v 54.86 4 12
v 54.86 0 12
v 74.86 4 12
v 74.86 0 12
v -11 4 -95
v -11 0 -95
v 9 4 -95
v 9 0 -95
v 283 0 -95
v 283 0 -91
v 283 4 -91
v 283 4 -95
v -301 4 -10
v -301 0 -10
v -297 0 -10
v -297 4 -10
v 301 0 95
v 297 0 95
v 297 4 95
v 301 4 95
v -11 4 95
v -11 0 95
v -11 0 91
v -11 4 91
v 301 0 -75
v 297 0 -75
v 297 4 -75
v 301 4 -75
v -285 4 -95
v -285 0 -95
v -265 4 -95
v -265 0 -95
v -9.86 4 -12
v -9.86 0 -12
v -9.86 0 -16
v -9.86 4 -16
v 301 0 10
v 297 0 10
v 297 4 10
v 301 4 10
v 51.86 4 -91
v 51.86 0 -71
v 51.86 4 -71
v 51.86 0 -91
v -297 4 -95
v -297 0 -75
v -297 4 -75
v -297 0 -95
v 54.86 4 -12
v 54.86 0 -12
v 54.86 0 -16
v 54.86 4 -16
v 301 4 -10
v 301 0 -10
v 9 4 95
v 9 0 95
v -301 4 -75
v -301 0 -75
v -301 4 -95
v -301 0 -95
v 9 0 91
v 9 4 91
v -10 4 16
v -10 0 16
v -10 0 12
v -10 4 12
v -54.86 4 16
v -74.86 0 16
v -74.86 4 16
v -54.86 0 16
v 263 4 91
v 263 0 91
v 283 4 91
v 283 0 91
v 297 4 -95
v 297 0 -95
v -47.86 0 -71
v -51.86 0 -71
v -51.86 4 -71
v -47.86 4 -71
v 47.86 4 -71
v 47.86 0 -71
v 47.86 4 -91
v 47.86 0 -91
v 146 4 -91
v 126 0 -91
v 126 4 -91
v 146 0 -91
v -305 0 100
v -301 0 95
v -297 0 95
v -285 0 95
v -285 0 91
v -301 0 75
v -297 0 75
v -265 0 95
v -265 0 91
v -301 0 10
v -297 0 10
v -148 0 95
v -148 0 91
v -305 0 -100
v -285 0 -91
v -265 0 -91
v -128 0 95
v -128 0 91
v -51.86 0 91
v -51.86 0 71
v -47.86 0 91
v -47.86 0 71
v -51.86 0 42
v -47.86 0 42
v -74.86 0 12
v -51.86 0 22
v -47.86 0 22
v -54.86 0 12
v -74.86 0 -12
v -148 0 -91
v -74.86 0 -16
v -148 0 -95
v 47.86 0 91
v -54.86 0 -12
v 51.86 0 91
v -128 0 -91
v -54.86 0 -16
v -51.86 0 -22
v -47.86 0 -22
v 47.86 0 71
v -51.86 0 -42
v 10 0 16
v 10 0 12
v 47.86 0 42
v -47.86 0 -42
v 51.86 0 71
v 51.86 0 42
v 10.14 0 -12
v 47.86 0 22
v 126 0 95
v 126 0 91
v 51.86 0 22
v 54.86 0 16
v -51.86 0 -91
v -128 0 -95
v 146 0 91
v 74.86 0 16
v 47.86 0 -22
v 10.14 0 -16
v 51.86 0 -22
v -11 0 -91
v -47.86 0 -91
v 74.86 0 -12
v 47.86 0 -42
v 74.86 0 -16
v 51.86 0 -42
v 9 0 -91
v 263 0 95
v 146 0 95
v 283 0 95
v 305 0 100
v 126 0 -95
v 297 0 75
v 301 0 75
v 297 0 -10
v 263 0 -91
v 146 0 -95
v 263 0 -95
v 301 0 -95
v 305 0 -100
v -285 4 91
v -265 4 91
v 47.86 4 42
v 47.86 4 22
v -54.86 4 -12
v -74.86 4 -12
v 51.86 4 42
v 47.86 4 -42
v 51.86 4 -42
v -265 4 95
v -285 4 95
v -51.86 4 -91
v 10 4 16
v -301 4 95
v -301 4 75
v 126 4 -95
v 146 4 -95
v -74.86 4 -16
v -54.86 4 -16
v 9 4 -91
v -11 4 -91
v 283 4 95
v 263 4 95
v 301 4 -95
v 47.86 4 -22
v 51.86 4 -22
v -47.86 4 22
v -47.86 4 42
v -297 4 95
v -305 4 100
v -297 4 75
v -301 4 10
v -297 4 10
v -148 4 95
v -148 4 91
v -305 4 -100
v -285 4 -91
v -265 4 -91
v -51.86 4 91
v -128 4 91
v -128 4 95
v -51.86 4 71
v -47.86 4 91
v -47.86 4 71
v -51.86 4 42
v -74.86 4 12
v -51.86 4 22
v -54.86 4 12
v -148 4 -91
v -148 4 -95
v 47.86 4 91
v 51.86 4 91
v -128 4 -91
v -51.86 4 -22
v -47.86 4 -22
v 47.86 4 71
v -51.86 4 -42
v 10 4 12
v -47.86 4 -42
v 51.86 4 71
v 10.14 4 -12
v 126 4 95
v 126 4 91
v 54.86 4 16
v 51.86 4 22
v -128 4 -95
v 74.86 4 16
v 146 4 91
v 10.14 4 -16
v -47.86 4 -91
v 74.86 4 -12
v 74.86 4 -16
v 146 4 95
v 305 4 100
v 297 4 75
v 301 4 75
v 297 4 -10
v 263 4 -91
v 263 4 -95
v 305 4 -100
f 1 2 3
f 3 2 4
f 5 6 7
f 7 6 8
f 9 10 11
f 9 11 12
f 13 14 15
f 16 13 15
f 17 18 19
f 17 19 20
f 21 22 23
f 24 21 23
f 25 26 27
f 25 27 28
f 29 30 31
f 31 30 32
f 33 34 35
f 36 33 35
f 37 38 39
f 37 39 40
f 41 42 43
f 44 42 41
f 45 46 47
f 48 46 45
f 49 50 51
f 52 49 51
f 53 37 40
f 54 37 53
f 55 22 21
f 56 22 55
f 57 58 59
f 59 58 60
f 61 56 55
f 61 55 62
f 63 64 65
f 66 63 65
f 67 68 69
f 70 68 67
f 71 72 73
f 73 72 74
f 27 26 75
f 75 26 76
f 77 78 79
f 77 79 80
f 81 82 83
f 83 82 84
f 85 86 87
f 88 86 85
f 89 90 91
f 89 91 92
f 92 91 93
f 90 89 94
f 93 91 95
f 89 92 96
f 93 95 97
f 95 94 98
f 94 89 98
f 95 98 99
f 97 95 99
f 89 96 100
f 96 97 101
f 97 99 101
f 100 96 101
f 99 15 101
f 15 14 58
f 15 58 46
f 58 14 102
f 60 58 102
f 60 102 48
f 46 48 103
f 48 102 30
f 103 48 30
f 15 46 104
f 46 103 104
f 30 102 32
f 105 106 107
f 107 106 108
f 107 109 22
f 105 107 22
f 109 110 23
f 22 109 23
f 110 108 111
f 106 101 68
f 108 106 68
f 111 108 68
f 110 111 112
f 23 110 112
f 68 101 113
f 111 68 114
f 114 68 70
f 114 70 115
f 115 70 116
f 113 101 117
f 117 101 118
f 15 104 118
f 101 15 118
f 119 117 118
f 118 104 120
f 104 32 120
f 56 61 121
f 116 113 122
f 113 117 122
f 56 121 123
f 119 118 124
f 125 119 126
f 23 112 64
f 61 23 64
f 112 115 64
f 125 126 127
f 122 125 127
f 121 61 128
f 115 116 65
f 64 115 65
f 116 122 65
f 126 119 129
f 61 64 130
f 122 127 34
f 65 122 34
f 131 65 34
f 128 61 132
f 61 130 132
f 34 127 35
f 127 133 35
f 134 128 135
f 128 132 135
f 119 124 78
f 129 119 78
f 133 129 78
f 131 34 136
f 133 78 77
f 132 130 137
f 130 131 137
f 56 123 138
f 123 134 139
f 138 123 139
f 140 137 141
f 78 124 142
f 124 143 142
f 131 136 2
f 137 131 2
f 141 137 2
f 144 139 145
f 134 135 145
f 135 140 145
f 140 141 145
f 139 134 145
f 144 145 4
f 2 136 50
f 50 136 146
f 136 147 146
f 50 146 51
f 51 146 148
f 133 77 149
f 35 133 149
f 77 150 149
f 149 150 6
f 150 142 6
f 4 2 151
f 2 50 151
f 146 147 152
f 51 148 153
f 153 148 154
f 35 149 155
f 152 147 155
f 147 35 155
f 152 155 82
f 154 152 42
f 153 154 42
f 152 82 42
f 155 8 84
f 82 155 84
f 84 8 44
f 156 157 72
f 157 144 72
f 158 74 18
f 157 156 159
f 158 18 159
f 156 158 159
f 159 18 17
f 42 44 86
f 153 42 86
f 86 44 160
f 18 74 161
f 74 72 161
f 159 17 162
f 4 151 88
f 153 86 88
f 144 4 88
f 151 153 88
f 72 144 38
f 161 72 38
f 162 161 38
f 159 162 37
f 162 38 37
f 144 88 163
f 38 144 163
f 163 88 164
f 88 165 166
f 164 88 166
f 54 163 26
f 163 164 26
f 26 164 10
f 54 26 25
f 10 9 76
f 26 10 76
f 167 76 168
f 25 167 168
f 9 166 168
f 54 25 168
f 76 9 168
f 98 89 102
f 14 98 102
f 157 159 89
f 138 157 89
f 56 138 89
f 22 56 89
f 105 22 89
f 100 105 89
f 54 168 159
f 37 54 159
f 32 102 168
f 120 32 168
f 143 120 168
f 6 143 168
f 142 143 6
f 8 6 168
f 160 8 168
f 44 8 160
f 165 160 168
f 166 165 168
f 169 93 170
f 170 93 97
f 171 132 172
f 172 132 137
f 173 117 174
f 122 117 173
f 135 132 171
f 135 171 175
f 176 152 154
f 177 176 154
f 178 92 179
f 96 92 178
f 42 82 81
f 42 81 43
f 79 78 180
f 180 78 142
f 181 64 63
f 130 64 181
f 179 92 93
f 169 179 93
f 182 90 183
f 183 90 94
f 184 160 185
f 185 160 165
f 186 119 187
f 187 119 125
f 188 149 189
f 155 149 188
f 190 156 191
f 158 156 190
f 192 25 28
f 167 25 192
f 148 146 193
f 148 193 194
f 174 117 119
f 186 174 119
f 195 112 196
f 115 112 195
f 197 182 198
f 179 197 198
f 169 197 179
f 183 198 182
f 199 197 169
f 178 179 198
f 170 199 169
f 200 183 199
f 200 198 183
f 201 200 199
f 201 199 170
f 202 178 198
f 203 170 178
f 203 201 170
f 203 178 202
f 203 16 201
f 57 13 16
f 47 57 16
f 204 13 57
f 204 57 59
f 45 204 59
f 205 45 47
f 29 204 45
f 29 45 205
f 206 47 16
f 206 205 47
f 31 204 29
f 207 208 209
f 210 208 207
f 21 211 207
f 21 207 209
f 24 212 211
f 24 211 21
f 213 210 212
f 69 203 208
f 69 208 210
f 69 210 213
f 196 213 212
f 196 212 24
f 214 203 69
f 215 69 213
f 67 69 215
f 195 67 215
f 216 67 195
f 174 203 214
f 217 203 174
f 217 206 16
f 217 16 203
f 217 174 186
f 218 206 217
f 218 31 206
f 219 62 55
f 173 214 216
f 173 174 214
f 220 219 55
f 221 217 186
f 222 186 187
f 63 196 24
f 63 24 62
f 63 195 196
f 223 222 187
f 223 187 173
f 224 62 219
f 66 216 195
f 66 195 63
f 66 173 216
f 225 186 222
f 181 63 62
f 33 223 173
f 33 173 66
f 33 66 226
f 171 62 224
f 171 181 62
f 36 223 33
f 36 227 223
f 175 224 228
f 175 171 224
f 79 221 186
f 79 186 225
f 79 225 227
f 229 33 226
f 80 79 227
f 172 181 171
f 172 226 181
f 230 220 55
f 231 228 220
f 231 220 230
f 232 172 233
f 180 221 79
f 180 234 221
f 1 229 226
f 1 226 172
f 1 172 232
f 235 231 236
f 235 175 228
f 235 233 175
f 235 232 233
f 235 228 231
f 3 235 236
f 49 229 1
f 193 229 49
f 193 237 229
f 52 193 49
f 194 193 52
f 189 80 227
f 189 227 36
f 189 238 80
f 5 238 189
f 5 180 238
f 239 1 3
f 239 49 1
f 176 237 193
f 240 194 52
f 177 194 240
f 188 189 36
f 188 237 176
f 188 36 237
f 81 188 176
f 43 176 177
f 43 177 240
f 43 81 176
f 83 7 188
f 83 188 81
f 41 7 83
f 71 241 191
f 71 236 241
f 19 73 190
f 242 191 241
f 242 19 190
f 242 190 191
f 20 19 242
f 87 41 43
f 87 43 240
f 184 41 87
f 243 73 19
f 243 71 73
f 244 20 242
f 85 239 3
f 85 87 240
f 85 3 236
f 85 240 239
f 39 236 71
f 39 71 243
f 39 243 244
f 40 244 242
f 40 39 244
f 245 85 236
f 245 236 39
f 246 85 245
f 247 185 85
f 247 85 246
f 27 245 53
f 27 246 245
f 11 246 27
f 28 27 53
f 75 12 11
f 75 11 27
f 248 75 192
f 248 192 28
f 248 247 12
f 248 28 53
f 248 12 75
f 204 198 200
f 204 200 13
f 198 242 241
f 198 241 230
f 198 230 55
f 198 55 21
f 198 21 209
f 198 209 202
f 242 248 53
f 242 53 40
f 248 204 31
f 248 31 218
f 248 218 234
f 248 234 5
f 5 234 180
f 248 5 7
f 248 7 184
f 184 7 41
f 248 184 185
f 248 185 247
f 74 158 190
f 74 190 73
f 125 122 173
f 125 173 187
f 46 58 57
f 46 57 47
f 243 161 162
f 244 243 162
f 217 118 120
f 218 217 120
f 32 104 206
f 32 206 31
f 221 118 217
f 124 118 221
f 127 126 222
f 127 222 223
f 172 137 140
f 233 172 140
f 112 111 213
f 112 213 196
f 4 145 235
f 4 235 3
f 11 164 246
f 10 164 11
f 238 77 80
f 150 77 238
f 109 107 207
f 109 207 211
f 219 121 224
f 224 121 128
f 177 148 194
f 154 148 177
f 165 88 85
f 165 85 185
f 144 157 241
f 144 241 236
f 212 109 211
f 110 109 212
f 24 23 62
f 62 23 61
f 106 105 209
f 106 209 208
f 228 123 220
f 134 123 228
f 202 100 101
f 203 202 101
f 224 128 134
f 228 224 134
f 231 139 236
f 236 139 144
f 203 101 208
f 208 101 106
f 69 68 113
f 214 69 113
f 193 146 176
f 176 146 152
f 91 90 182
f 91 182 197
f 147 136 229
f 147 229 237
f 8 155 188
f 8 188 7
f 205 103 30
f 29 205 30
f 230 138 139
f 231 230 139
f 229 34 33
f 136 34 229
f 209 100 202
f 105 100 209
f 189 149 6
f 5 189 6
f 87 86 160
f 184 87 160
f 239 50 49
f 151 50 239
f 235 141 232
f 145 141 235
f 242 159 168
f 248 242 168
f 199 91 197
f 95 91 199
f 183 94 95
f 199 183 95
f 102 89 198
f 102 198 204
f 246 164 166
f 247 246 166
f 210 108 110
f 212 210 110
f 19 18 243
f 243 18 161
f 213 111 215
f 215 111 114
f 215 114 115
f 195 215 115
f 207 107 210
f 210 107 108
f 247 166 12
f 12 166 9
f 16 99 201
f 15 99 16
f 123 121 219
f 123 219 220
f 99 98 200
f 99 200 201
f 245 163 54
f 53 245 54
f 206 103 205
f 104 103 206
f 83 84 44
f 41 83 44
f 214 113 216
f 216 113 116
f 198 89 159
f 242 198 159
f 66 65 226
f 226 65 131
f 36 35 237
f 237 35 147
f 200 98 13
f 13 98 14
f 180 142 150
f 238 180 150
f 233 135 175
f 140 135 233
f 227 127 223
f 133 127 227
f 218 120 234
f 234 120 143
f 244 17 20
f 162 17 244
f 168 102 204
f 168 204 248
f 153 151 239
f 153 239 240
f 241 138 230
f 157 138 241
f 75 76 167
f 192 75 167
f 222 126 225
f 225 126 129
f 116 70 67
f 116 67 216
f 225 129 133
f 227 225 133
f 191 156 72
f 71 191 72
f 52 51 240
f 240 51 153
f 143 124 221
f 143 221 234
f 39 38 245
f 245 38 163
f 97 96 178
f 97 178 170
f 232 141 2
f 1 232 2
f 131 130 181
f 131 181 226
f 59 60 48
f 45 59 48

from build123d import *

# Parameters (mm, degrees)
SKETCH1_W           = 610
SKETCH1_H           = 200
SKETCH1_W_2         = 4
SKETCH1_H_2         = 20
SKETCH1_W_3         = 20
SKETCH1_H_3         = 4
BOSS_EXTRUDE1_DEPTH = 4


with BuildPart() as part:
    # Sketch1 → Boss-Extrude1 (new body)
    with BuildSketch(Plane(origin=(0, 0, 0), x_dir=(1, 0, 0), z_dir=(0, 1, 0))):
        Rectangle(SKETCH1_W, SKETCH1_H)
        with Locations((-299, -85)):
            Rectangle(SKETCH1_W_2, SKETCH1_H_2, mode=Mode.SUBTRACT)
        with Locations((-299, 85)):
            Rectangle(SKETCH1_W_2, SKETCH1_H_2, mode=Mode.SUBTRACT)
        with Locations((-299, 0)):
            Rectangle(SKETCH1_W_2, SKETCH1_H_2, mode=Mode.SUBTRACT)
        with Locations((-275, 93)):
            Rectangle(SKETCH1_W_3, SKETCH1_H_3, mode=Mode.SUBTRACT)
        with Locations((-138, 93)):
            Rectangle(SKETCH1_W_3, SKETCH1_H_3, mode=Mode.SUBTRACT)
        with Locations((-1, 93)):
            Rectangle(SKETCH1_W_3, SKETCH1_H_3, mode=Mode.SUBTRACT)
        with Locations((-1, -93)):
            Rectangle(SKETCH1_W_3, SKETCH1_H_3, mode=Mode.SUBTRACT)
        with Locations((-138, -93)):
            Rectangle(SKETCH1_W_3, SKETCH1_H_3, mode=Mode.SUBTRACT)
        with Locations((-275, -93)):
            Rectangle(SKETCH1_W_3, SKETCH1_H_3, mode=Mode.SUBTRACT)
        with Locations((-49.859697176, -81)):
            Rectangle(SKETCH1_W_2, SKETCH1_H_2, mode=Mode.SUBTRACT)
        with Locations((-49.859697176, -32)):
            Rectangle(SKETCH1_W_2, SKETCH1_H_2, mode=Mode.SUBTRACT)
        with Locations((-64.859697176, -14)):
            Rectangle(SKETCH1_W_3, SKETCH1_H_3, mode=Mode.SUBTRACT)
        with Locations((-64.859697176, 14)):
            Rectangle(SKETCH1_W_3, SKETCH1_H_3, mode=Mode.SUBTRACT)
        with Locations((-49.859697176, 32)):
            Rectangle(SKETCH1_W_2, SKETCH1_H_2, mode=Mode.SUBTRACT)
        with Locations((0, -14)):
            Rectangle(SKETCH1_W_3, SKETCH1_H_3, mode=Mode.SUBTRACT)
        with Locations((0.140302824, 14)):
            Rectangle(SKETCH1_W_3, SKETCH1_H_3, mode=Mode.SUBTRACT)
        with Locations((136, 93)):
            Rectangle(SKETCH1_W_3, SKETCH1_H_3, mode=Mode.SUBTRACT)
        with Locations((273, 93)):
            Rectangle(SKETCH1_W_3, SKETCH1_H_3, mode=Mode.SUBTRACT)
        with Locations((49.859697176, -81)):
            Rectangle(SKETCH1_W_2, SKETCH1_H_2, mode=Mode.SUBTRACT)
        with Locations((49.859697176, -32)):
            Rectangle(SKETCH1_W_2, SKETCH1_H_2, mode=Mode.SUBTRACT)
        with Locations((64.859697176, -14)):
            Rectangle(SKETCH1_W_3, SKETCH1_H_3, mode=Mode.SUBTRACT)
        with Locations((64.859697176, 14)):
            Rectangle(SKETCH1_W_3, SKETCH1_H_3, mode=Mode.SUBTRACT)
        with Locations((49.859697176, 32)):
            Rectangle(SKETCH1_W_2, SKETCH1_H_2, mode=Mode.SUBTRACT)
        with Locations((273, -93)):
            Rectangle(SKETCH1_W_3, SKETCH1_H_3, mode=Mode.SUBTRACT)
        with Locations((136, -93)):
            Rectangle(SKETCH1_W_3, SKETCH1_H_3, mode=Mode.SUBTRACT)
        with Locations((49.859697176, 81)):
            Rectangle(SKETCH1_W_2, SKETCH1_H_2, mode=Mode.SUBTRACT)
        with Locations((-49.859697176, 81)):
            Rectangle(SKETCH1_W_2, SKETCH1_H_2, mode=Mode.SUBTRACT)
        with Locations((299, 85)):
            Rectangle(SKETCH1_W_2, SKETCH1_H_2, mode=Mode.SUBTRACT)
        with Locations((299, 0)):
            Rectangle(SKETCH1_W_2, SKETCH1_H_2, mode=Mode.SUBTRACT)
        with Locations((299, -85)):
            Rectangle(SKETCH1_W_2, SKETCH1_H_2, mode=Mode.SUBTRACT)
    extrude(amount=BOSS_EXTRUDE1_DEPTH)


solid = part.part
